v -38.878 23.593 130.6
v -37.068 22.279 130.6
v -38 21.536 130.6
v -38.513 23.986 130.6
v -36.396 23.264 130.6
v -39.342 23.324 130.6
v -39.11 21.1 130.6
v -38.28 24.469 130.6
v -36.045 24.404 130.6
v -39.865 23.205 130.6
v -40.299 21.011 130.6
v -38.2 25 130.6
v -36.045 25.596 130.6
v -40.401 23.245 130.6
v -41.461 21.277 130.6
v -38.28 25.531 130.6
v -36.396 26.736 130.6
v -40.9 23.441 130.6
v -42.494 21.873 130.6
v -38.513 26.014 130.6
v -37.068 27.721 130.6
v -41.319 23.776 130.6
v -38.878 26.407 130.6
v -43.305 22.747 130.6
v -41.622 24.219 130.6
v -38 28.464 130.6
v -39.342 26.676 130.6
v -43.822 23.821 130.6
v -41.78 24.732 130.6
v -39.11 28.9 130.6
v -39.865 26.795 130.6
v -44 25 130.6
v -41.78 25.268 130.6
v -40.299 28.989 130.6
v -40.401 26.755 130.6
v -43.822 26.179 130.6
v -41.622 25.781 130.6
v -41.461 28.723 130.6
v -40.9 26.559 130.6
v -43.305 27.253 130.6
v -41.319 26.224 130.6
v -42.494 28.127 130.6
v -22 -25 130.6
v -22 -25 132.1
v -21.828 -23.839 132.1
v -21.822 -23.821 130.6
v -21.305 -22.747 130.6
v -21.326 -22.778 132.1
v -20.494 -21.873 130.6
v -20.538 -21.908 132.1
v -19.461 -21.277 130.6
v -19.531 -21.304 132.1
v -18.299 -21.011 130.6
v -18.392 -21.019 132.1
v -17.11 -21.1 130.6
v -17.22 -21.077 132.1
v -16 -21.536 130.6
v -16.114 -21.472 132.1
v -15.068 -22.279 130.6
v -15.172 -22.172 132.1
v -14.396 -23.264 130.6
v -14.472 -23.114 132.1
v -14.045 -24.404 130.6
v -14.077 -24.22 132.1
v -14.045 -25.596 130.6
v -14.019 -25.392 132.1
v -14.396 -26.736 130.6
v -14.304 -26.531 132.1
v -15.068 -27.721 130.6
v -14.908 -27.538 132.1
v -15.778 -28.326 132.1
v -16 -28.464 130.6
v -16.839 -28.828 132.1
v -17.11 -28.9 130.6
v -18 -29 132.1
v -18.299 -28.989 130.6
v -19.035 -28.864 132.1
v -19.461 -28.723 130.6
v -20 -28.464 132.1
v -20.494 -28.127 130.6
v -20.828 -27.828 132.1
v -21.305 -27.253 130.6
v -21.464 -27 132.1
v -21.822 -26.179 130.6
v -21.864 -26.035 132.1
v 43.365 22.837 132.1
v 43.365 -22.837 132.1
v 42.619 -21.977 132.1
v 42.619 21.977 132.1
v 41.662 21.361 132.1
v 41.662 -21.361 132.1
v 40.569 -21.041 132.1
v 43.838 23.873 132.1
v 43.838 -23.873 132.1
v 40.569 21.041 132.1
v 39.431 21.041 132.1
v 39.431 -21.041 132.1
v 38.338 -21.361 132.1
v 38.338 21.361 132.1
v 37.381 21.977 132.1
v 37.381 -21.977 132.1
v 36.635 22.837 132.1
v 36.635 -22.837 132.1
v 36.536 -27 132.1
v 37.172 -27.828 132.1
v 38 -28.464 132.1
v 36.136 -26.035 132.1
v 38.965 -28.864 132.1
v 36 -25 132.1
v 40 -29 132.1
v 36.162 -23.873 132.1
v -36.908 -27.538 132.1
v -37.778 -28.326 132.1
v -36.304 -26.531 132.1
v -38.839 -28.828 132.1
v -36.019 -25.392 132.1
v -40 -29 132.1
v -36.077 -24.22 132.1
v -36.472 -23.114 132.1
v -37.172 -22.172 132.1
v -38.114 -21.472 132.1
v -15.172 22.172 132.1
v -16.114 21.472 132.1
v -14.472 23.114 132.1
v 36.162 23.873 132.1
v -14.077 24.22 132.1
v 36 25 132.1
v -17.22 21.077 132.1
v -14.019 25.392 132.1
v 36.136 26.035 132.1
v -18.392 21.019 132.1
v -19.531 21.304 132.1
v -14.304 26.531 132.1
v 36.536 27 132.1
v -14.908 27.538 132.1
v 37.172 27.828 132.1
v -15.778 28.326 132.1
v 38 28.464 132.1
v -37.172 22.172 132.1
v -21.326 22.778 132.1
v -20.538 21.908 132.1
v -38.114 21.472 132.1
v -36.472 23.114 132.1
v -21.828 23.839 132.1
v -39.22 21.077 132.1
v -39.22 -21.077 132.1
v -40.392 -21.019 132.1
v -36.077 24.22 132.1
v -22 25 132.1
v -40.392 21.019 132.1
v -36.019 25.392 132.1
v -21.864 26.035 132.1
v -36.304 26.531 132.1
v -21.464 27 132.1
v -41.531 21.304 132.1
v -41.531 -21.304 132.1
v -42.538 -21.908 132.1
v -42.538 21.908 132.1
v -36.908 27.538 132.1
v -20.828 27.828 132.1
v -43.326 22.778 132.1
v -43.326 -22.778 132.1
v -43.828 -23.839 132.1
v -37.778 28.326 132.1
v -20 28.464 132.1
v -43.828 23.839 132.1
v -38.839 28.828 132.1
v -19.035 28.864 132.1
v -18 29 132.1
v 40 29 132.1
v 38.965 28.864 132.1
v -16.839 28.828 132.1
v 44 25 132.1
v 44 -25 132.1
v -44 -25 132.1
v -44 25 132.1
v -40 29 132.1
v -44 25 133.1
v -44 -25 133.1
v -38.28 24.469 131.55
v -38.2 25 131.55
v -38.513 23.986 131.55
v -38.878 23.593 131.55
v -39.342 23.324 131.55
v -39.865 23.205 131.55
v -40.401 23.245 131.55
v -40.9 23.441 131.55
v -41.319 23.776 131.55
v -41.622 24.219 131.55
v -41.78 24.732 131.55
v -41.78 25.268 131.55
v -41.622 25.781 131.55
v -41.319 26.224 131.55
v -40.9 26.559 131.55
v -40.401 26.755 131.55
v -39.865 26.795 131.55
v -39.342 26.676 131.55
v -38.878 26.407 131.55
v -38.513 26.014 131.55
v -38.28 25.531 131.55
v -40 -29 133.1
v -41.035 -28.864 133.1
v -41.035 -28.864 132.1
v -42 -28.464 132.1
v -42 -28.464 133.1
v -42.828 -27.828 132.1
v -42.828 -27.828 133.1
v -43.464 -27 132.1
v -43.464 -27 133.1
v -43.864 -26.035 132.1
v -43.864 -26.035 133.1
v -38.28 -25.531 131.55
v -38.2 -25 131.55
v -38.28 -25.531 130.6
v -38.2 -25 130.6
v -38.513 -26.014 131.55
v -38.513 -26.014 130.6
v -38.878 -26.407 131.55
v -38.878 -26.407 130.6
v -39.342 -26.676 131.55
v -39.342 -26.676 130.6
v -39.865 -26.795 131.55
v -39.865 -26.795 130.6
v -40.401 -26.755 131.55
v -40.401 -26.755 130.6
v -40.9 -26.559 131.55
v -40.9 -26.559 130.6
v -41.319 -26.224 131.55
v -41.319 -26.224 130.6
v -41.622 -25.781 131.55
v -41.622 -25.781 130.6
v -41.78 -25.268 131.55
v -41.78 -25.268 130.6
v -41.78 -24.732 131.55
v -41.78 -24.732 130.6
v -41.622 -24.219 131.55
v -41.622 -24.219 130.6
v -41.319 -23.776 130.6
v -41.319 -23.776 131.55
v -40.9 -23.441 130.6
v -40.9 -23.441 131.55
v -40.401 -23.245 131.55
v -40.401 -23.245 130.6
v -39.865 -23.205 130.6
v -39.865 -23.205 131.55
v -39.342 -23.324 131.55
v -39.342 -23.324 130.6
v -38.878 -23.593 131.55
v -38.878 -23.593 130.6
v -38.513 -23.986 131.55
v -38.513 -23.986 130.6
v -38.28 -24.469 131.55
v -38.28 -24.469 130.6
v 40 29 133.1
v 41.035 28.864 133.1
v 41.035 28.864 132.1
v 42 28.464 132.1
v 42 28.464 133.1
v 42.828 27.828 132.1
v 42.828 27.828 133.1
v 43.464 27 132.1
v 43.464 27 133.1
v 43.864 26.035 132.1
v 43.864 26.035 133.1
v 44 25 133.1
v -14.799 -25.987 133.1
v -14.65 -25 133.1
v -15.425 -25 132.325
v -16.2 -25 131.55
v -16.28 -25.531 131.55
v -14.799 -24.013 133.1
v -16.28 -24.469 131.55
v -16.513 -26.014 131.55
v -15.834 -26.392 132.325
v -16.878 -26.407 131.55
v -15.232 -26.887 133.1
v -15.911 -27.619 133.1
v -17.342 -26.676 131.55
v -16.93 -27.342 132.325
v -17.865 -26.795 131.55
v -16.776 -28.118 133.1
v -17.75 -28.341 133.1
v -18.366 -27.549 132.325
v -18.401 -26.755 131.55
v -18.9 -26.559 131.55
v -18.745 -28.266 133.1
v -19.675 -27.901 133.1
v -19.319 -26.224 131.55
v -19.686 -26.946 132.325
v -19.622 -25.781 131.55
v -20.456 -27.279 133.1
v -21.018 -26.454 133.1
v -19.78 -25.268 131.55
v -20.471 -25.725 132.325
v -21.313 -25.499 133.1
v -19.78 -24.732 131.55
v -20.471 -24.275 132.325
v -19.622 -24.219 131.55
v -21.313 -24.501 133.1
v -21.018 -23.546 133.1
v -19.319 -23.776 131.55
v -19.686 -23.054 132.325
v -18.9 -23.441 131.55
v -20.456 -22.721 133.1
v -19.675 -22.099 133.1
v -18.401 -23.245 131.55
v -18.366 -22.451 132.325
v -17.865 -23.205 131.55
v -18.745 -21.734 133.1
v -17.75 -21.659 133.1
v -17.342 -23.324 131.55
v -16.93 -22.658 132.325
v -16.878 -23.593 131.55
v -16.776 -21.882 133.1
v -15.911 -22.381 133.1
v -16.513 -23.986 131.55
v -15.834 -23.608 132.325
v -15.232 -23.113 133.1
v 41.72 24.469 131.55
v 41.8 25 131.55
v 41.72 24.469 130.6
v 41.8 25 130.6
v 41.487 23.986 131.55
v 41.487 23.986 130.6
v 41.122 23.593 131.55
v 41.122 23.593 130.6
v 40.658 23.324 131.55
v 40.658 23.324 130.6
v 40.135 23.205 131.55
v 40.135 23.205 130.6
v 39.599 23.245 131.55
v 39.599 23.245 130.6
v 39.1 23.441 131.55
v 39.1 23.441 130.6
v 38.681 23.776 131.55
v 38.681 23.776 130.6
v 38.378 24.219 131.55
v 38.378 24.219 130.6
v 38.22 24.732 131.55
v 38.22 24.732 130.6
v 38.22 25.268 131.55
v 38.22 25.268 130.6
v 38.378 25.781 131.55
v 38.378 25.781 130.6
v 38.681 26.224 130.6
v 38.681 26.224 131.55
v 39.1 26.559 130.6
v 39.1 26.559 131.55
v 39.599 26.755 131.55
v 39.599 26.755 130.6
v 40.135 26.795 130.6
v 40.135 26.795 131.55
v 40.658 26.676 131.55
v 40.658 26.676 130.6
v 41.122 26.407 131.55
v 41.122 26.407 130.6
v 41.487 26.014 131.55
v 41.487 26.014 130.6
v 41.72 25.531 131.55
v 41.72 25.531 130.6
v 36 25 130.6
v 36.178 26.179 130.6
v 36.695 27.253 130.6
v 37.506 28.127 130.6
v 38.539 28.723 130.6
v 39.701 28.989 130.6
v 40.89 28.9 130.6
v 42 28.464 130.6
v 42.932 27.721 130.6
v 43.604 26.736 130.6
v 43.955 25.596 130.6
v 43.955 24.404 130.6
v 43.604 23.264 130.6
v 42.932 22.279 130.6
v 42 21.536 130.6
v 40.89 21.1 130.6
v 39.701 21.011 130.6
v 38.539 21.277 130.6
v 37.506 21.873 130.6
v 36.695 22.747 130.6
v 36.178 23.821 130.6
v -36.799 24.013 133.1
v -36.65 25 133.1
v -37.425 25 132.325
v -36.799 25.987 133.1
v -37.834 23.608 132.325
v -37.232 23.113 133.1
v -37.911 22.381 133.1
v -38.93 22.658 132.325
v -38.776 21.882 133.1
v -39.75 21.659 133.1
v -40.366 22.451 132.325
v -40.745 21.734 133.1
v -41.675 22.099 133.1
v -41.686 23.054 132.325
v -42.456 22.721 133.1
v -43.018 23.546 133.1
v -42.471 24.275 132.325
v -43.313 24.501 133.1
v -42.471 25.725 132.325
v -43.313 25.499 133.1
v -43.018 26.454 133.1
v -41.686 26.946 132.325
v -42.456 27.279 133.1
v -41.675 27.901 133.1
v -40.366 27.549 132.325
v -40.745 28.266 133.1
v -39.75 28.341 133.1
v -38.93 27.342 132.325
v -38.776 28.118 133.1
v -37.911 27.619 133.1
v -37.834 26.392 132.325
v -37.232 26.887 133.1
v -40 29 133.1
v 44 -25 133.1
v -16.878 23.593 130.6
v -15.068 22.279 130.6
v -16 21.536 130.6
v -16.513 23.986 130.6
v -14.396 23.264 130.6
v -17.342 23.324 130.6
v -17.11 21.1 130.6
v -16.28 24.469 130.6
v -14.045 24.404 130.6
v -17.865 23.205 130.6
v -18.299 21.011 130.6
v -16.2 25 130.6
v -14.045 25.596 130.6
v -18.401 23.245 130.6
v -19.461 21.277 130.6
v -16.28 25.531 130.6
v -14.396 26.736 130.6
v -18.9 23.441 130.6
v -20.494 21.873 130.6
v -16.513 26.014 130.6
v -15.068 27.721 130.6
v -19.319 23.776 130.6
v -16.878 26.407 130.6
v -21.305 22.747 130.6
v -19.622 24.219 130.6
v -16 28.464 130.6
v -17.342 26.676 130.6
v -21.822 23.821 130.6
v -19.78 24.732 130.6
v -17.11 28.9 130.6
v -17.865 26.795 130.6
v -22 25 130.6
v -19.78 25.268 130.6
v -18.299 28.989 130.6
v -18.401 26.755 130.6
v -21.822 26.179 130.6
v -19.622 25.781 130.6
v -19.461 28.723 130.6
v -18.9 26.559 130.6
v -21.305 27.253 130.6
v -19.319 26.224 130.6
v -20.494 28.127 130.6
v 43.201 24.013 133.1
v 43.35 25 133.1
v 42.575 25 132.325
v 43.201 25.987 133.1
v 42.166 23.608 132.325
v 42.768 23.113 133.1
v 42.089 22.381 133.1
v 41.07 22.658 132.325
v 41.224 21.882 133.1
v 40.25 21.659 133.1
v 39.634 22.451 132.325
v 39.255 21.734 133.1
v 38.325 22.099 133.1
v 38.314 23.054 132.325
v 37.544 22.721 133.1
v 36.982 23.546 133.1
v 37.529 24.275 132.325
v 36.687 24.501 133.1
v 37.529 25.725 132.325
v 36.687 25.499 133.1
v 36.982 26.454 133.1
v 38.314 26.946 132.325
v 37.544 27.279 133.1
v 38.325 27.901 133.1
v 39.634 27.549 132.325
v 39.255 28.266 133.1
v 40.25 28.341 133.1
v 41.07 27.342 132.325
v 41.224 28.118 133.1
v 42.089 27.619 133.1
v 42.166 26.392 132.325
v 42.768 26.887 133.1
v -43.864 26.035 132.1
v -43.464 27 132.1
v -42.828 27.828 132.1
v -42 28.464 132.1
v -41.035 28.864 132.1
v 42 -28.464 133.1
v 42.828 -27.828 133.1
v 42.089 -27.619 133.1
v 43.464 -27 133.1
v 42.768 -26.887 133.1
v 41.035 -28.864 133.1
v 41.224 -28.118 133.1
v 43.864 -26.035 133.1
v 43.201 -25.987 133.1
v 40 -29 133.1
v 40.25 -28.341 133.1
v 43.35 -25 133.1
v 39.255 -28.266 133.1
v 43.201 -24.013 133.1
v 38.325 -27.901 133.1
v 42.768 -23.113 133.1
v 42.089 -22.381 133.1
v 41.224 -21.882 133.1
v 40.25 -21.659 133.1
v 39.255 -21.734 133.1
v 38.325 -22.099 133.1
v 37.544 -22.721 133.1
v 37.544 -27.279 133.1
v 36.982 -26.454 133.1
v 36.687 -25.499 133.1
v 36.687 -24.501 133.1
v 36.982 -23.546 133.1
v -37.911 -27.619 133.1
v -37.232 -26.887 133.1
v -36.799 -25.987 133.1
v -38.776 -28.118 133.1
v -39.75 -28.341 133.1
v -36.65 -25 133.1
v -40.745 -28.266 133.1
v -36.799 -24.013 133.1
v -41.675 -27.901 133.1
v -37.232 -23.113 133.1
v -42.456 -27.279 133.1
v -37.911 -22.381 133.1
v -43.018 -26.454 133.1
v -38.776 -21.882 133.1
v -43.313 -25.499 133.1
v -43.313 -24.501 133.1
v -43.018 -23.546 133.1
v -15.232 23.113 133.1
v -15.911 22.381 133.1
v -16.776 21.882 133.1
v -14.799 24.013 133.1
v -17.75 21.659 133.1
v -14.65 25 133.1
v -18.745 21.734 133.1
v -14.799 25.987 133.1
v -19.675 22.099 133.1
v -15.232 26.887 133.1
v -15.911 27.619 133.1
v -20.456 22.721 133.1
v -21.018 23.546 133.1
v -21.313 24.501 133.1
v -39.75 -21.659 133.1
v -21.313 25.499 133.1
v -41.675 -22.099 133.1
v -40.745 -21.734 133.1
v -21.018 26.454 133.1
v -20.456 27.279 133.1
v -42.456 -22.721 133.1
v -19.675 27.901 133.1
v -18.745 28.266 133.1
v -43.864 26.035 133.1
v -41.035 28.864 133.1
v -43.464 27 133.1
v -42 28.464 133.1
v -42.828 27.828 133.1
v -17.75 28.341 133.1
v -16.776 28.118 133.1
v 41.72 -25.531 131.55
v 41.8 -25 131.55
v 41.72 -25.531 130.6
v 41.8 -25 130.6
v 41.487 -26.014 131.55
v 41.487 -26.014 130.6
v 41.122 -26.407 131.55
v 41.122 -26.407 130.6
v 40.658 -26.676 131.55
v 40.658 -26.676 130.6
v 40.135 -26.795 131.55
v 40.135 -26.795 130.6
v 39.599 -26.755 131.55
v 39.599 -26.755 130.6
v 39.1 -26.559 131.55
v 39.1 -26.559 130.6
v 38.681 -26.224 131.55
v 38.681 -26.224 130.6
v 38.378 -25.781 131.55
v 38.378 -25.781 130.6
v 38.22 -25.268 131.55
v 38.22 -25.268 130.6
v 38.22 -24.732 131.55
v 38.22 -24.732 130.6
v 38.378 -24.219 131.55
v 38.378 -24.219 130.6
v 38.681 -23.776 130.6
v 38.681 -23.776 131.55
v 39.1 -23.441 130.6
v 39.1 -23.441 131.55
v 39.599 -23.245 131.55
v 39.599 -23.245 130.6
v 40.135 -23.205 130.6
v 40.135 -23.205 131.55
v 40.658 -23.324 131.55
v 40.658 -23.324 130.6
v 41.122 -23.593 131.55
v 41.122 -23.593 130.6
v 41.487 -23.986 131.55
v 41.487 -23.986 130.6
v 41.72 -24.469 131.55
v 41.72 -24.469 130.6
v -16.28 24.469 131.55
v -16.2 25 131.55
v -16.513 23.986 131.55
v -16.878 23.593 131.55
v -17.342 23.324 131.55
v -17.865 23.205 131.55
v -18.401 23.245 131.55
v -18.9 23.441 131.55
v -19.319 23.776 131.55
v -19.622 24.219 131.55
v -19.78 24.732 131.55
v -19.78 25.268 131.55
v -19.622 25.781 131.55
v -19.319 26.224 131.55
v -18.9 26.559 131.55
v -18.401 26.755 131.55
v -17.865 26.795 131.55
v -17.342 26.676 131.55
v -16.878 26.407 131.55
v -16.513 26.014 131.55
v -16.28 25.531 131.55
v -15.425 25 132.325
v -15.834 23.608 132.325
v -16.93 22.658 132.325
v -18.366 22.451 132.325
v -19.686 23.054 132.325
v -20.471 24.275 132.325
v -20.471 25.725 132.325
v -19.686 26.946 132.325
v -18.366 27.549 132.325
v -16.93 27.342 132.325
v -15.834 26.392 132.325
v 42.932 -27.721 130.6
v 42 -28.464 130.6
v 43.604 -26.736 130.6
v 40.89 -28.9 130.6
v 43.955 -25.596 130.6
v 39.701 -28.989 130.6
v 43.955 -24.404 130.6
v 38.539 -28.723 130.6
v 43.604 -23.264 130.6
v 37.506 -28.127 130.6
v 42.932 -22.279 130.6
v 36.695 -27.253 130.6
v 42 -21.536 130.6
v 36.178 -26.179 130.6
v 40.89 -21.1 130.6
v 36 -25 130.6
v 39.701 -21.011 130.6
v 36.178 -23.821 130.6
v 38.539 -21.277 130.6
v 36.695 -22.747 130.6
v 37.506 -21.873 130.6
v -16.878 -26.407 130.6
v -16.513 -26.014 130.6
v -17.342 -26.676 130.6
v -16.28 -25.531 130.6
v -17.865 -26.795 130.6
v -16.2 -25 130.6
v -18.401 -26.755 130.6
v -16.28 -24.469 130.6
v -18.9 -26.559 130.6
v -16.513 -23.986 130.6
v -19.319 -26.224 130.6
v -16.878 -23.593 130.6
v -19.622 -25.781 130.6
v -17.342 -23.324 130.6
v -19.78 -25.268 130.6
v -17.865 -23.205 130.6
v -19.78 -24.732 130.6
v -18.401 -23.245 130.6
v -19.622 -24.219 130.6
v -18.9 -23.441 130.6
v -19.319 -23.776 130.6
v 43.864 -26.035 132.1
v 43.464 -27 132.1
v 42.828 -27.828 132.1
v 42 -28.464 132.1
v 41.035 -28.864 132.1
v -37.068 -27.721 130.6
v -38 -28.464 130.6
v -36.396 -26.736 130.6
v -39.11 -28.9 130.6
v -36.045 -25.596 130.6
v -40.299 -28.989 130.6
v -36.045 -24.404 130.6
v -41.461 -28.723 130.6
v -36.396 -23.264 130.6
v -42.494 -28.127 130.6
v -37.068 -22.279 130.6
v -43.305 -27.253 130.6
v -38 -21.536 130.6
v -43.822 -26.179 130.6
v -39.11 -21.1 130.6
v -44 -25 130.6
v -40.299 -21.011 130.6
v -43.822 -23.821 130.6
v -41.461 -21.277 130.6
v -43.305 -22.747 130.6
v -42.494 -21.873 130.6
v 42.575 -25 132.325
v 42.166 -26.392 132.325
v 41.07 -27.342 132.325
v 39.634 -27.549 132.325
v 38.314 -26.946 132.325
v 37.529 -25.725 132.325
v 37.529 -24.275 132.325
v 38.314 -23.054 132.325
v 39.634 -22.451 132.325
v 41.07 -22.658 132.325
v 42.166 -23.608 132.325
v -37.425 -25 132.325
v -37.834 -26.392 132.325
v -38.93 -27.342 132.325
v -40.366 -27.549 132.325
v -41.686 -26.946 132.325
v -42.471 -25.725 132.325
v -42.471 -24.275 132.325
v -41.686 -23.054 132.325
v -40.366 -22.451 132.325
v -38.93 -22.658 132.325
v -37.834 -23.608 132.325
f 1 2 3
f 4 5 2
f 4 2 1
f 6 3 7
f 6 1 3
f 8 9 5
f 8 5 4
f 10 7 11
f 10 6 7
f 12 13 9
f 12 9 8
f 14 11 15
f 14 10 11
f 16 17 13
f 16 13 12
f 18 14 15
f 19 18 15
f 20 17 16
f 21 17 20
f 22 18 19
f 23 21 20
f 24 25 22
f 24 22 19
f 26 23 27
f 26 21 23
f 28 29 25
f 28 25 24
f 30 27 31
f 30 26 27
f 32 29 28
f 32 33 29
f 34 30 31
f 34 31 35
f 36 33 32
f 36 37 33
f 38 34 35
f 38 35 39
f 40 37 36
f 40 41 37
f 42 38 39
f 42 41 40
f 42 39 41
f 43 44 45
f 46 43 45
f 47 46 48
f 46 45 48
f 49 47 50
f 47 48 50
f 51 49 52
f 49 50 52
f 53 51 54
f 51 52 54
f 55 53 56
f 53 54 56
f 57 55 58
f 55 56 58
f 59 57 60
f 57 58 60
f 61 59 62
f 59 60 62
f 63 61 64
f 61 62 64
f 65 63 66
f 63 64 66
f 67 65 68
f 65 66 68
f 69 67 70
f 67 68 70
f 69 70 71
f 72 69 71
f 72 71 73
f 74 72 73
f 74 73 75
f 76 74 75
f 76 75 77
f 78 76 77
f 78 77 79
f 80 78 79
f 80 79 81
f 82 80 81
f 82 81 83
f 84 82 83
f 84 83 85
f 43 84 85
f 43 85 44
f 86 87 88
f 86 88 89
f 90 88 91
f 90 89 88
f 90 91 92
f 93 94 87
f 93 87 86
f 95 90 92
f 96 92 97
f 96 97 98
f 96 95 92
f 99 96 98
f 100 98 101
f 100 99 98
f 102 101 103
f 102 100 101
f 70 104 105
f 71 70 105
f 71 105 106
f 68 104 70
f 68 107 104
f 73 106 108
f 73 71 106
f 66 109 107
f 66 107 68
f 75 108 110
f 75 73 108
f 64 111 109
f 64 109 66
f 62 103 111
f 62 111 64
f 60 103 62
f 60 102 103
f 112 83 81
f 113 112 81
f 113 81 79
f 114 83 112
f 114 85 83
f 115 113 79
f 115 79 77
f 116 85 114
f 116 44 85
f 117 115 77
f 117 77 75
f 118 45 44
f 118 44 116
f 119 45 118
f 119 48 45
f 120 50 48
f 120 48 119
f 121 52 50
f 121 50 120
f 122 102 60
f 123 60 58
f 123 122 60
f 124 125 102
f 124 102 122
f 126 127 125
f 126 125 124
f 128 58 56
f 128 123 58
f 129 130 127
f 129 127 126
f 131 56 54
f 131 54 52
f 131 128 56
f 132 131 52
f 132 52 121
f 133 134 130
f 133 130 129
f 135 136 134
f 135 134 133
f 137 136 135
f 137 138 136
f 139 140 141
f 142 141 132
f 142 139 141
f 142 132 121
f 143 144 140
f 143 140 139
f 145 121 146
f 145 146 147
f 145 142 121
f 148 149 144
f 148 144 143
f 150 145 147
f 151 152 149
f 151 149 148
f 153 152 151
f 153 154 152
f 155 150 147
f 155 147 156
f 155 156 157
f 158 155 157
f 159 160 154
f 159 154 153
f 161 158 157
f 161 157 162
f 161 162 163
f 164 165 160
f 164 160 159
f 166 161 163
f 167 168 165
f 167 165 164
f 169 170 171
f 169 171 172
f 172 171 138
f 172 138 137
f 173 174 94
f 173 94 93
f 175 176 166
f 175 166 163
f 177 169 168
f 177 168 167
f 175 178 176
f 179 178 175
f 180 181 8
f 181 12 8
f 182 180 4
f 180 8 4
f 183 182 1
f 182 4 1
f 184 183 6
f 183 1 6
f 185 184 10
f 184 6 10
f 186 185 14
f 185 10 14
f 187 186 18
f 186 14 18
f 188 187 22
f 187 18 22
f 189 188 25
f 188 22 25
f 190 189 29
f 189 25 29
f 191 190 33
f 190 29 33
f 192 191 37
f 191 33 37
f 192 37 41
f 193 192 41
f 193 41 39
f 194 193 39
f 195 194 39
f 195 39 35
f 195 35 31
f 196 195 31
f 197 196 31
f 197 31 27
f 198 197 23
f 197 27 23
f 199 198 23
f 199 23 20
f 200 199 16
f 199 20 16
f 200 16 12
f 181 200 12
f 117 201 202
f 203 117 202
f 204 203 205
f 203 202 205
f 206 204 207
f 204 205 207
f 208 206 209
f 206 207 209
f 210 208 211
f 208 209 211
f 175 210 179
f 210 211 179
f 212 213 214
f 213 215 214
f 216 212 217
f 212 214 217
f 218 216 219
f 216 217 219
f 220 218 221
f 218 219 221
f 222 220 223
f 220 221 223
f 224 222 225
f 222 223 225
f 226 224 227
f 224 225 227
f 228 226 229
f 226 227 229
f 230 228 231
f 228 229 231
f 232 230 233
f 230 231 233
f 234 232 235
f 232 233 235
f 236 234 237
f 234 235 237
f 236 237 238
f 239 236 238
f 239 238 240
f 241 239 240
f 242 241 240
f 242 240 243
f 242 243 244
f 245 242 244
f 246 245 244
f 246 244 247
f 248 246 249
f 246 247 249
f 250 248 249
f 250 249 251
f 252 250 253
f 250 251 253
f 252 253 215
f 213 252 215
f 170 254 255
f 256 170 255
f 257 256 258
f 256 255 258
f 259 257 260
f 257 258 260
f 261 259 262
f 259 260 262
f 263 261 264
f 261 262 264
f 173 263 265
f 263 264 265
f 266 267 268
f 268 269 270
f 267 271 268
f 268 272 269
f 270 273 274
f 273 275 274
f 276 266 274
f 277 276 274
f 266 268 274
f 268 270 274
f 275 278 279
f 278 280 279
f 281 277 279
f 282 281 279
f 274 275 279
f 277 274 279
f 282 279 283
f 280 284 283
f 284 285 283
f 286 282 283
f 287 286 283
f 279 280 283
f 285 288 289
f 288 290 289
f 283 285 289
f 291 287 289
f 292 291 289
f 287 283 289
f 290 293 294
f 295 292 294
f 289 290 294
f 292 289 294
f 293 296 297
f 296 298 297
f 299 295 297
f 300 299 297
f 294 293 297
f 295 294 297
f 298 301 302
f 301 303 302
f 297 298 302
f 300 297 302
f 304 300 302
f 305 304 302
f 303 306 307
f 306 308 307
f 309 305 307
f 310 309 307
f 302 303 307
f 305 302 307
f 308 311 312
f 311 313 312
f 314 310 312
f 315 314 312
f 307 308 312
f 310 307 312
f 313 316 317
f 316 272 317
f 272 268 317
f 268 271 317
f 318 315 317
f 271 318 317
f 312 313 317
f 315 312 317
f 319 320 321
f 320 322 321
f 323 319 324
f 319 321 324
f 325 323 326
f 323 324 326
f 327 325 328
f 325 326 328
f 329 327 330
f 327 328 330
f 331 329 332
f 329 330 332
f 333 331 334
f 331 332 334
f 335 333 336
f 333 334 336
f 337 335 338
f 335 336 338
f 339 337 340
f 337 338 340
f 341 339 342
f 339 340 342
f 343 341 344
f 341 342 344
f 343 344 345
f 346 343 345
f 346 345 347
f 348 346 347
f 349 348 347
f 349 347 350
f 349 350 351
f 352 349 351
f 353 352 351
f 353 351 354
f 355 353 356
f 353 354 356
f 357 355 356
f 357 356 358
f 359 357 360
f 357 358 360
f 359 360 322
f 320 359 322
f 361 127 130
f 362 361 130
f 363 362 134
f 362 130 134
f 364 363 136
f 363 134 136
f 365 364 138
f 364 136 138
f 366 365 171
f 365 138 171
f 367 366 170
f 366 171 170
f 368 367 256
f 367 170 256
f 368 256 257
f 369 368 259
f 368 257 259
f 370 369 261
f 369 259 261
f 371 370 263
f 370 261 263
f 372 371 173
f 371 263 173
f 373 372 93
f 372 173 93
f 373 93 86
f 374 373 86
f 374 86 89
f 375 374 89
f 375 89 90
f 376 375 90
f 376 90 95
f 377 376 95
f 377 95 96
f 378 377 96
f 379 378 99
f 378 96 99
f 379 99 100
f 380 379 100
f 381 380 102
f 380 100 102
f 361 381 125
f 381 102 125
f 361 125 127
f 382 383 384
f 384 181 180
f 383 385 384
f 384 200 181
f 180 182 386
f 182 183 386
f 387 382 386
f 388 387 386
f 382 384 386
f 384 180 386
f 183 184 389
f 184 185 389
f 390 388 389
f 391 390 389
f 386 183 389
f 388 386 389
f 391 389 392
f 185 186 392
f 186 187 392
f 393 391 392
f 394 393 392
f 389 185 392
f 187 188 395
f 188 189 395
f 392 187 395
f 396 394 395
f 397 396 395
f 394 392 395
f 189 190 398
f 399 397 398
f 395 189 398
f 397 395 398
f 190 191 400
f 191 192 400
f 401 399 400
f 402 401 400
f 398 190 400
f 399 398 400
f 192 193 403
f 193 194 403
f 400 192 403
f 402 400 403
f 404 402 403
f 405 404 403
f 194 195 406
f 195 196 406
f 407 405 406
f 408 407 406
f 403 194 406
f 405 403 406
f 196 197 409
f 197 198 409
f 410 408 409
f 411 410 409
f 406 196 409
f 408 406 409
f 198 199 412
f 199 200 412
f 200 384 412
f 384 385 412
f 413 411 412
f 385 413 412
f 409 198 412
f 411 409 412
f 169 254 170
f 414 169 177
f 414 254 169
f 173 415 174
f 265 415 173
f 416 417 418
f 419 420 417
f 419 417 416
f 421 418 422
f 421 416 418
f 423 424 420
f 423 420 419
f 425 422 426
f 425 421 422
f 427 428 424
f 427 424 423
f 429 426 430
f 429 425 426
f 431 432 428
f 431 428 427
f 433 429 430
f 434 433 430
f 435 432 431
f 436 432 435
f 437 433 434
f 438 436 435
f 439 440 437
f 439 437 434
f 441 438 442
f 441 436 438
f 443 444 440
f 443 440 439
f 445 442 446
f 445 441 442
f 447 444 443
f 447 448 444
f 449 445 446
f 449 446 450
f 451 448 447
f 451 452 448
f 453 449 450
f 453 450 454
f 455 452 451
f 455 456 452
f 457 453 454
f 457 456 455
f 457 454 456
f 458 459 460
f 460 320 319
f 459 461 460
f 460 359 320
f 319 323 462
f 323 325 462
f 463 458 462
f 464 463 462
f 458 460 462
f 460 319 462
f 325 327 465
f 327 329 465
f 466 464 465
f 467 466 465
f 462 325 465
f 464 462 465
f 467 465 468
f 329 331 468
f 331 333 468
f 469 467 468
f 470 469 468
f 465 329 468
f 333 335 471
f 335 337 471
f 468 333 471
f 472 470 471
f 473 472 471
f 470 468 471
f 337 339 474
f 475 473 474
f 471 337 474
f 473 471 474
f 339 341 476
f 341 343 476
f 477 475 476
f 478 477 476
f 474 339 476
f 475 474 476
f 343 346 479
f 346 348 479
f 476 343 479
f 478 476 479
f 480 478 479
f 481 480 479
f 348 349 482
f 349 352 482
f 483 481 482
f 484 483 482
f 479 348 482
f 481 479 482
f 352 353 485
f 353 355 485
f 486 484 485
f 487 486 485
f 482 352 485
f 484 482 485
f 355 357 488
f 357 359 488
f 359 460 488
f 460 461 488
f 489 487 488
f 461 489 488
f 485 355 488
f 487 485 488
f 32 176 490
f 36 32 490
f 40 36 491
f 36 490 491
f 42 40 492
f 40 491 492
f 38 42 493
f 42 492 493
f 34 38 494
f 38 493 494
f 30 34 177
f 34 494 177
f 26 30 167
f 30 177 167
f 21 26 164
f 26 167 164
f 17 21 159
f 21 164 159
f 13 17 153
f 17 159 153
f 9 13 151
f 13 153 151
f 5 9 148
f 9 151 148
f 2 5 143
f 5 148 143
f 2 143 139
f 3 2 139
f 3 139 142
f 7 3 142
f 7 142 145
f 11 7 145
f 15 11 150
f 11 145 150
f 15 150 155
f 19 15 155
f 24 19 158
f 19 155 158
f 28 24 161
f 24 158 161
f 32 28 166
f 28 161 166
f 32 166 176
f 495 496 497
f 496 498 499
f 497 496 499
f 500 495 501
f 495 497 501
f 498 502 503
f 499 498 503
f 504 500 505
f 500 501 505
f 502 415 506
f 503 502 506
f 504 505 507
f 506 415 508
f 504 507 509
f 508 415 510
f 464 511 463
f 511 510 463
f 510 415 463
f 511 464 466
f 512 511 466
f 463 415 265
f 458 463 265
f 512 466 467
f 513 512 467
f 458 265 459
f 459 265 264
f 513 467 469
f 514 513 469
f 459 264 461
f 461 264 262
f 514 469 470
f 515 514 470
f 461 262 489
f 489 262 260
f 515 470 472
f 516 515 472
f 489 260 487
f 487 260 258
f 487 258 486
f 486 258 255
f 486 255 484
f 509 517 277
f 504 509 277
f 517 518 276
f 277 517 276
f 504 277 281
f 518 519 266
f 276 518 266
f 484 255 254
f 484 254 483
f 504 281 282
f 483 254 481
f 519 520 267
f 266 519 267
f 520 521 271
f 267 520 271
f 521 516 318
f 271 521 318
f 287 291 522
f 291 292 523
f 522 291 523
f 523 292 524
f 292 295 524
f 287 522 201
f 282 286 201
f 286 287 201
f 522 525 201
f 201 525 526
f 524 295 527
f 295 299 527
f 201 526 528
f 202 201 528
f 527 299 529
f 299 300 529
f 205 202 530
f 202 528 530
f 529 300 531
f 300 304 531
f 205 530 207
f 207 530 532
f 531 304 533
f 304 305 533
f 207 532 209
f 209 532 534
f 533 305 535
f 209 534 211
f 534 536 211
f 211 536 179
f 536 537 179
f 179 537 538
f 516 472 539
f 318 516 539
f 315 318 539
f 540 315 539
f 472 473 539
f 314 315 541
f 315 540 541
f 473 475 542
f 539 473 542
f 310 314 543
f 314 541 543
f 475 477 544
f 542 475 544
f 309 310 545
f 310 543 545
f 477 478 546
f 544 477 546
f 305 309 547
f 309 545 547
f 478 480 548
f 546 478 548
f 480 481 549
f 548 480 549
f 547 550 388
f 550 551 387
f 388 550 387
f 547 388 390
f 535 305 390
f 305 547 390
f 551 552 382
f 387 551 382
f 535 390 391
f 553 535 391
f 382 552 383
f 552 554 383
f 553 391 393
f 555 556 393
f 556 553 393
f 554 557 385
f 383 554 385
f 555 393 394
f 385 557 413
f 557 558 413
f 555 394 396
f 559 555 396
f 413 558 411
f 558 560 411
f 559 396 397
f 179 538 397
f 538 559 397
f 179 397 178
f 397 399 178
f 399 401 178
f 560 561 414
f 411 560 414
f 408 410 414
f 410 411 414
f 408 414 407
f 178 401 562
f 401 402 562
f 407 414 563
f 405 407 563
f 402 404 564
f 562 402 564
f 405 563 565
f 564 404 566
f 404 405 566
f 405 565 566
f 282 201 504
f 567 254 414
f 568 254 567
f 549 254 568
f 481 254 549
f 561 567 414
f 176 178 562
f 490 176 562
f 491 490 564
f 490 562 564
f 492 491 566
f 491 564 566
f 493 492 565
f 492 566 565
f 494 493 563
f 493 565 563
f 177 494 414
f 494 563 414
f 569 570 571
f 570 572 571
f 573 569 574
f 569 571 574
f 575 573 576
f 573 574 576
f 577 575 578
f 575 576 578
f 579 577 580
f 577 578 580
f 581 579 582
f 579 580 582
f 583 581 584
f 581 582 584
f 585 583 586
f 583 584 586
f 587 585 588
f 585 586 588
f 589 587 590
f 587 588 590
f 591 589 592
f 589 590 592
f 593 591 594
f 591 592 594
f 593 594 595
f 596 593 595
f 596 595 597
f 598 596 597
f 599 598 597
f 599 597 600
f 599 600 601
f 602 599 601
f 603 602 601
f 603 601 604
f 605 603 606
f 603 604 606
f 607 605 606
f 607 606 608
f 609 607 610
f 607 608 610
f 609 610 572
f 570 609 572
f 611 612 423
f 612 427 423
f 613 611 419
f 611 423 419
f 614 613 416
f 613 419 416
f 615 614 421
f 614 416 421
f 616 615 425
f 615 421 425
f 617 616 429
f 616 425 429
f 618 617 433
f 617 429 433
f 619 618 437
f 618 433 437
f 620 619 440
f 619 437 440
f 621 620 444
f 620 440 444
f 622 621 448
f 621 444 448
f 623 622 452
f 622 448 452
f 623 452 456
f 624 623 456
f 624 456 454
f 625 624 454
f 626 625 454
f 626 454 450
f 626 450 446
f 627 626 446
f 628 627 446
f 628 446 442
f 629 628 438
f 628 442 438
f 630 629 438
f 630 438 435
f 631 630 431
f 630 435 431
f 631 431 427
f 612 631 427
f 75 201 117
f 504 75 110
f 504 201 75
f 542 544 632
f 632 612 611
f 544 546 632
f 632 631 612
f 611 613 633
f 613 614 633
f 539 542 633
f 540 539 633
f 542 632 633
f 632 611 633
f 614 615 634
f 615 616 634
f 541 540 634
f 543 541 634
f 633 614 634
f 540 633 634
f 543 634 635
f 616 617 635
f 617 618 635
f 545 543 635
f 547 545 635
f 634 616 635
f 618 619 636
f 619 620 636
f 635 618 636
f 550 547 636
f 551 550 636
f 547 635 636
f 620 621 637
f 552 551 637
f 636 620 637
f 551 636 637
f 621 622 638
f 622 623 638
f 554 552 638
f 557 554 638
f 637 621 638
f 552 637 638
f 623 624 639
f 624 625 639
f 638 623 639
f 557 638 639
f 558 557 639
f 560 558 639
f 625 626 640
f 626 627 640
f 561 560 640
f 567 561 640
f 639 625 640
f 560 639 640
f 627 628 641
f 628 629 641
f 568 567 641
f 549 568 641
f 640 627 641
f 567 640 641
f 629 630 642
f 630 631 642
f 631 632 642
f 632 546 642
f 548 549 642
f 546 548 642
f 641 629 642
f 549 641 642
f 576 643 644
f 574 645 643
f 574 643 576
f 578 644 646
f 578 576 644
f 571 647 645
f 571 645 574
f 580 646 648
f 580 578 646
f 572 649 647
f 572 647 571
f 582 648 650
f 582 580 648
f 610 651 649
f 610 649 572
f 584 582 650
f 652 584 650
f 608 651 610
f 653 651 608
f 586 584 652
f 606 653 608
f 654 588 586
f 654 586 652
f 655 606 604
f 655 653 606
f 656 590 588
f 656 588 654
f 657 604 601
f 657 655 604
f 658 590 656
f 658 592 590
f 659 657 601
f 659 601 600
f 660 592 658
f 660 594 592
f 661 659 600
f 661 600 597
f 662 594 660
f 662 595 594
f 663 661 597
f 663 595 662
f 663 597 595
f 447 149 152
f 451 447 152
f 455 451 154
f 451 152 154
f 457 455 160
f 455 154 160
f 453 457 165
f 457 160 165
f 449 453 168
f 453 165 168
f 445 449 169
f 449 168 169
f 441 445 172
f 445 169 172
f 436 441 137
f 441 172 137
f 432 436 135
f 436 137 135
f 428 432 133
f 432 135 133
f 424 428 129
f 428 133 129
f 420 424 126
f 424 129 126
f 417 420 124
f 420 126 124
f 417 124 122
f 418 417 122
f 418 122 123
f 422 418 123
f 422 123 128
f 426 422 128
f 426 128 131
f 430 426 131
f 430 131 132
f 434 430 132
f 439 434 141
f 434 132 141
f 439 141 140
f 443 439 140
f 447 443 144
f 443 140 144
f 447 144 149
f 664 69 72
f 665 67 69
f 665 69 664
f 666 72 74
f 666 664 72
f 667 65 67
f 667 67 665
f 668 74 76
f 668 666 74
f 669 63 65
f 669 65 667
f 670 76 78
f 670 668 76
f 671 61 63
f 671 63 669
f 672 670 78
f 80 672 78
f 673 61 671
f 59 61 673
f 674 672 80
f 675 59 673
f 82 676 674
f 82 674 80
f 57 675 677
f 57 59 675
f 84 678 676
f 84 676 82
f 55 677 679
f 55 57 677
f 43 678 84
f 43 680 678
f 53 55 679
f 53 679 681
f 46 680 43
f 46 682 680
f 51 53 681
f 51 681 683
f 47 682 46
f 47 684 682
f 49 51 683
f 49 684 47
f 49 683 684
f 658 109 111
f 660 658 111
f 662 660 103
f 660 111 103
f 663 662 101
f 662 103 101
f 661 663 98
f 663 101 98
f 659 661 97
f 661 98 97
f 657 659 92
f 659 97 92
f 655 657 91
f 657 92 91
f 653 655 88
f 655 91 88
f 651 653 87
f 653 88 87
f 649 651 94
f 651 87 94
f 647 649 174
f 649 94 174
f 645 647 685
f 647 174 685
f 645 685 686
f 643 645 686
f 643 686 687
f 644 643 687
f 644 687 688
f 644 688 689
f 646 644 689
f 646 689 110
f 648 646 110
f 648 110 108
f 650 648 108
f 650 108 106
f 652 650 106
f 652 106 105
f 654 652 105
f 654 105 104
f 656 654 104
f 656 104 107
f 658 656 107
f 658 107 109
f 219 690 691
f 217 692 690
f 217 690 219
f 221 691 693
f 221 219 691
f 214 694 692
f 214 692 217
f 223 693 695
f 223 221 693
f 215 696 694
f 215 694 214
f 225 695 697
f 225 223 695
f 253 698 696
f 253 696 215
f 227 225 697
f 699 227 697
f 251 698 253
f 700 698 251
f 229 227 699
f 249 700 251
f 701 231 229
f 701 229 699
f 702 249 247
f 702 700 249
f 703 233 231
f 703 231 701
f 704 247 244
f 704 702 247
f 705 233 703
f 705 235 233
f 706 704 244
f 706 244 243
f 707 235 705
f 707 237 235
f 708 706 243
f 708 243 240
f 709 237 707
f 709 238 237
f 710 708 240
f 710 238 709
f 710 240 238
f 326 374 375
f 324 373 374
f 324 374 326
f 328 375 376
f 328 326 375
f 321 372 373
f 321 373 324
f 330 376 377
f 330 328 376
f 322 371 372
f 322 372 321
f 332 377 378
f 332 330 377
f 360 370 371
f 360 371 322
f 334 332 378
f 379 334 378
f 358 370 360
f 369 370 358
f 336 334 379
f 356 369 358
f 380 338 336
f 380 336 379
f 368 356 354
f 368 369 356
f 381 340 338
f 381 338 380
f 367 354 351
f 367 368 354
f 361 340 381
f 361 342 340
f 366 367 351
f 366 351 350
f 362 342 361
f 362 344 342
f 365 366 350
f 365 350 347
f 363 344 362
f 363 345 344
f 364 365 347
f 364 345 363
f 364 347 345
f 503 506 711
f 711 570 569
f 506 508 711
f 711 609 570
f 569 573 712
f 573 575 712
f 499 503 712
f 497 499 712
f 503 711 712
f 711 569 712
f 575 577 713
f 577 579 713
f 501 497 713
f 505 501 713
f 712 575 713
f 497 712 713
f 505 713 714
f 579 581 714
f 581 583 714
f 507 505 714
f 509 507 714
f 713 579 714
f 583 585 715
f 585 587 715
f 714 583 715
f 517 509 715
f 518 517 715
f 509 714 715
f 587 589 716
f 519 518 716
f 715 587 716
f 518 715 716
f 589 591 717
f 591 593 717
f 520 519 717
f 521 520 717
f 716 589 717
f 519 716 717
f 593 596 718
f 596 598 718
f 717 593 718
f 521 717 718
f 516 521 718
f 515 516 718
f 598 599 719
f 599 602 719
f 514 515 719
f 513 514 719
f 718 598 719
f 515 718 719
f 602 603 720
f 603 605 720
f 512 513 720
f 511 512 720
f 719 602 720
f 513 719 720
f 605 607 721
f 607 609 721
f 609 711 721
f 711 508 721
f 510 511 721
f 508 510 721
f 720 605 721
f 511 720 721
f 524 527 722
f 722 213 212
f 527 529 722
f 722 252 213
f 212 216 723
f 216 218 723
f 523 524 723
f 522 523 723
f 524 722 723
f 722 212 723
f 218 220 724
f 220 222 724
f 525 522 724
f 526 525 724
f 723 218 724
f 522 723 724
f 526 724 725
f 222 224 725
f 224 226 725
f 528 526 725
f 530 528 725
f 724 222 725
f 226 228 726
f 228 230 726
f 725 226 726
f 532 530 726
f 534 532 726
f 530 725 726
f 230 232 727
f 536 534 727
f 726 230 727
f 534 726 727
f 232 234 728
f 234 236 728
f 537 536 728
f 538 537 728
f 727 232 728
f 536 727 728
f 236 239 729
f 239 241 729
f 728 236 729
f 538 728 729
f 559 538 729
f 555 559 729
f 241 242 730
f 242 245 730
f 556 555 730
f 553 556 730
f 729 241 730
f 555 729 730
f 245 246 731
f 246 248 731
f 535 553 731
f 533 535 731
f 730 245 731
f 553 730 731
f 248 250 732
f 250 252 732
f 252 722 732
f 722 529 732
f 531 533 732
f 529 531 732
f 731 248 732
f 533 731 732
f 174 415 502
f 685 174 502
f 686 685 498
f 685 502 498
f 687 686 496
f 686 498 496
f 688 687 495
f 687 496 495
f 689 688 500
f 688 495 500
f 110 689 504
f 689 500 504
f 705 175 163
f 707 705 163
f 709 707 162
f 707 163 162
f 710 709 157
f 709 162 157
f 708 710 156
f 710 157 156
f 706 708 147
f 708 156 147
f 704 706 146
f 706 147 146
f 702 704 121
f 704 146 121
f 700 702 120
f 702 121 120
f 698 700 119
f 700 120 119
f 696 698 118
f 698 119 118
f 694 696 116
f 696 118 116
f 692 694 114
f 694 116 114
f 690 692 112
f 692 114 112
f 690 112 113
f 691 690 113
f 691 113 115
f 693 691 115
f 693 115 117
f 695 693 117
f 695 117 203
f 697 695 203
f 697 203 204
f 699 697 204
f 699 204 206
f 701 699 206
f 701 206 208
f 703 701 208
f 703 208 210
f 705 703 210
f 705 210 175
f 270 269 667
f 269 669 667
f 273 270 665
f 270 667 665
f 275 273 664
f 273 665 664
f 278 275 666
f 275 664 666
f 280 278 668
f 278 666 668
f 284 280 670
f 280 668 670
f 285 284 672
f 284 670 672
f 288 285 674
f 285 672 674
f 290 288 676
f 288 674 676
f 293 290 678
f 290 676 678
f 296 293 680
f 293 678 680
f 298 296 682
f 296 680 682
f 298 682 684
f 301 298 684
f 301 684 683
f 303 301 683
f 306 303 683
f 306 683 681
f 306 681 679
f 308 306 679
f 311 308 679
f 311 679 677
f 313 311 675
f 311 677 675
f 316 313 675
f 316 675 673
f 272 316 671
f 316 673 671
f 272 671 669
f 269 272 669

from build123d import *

# Parameters (mm, degrees)
PAD007_DEPTH            = 1
SKETCH014_R             = 4
PAD008_DEPTH            = 2.5
HOLE_D                  = 3.6
HOLE_DEPTH              = 25
HOLE_CSINK_D            = 6.7
HOLE_CSINK_ANGLE        = 90
BODY003_PLACEMENT_ANGLE = 180


with BuildPart() as part:
    # Sketch013 → Pad007 (new body)
    with BuildSketch(Plane.XY):
        with BuildLine():
            ThreePointArc((-40, 29), (-42.828427, 27.828427), (-44, 25))
            Line((-44, -25), (-44, 25))
            ThreePointArc((-44, -25), (-42.828427, -27.828427), (-40, -29))
            Line((40, -29), (-40, -29))
            ThreePointArc((40, -29), (42.828427, -27.828427), (44, -25))
            Line((44, 25), (44, -25))
            ThreePointArc((44, 25), (42.828427, 27.828427), (40, 29))
            Line((-40, 29), (40, 29))
        make_face()
    extrude(amount=PAD007_DEPTH)

    # Sketch014 → Pad008 (join)
    with BuildSketch(Plane.XY):
        with Locations((-40, 25)):
            Circle(SKETCH014_R)
        with Locations((18, 25)):
            Circle(SKETCH014_R)
        with Locations((40, 25)):
            Circle(SKETCH014_R)
        with Locations((40, -25)):
            Circle(SKETCH014_R)
        with Locations((18, -25)):
            Circle(SKETCH014_R)
        with Locations((-40, -25)):
            Circle(SKETCH014_R)
    extrude(amount=PAD008_DEPTH)

    # Hole
    with Locations(Plane(origin=(0, 0, 0), x_dir=(1, 0, 0), z_dir=(0, 0, -1))):
        with Locations((-40, -25), (18, -25), (40, -25), (40, 25), (18, 25), (-40, 25)):
            CounterSinkHole(HOLE_D / 2, HOLE_CSINK_D / 2, depth=HOLE_DEPTH, counter_sink_angle=HOLE_CSINK_ANGLE)


with BuildPart() as part_1:
    # Body003 placement: moved
    add(part.part.moved(Location((0, 0, 133.1))).rotate(Axis((0, 0, 133.1), (0, 1, 0)), BODY003_PLACEMENT_ANGLE))


solid = part_1.part
